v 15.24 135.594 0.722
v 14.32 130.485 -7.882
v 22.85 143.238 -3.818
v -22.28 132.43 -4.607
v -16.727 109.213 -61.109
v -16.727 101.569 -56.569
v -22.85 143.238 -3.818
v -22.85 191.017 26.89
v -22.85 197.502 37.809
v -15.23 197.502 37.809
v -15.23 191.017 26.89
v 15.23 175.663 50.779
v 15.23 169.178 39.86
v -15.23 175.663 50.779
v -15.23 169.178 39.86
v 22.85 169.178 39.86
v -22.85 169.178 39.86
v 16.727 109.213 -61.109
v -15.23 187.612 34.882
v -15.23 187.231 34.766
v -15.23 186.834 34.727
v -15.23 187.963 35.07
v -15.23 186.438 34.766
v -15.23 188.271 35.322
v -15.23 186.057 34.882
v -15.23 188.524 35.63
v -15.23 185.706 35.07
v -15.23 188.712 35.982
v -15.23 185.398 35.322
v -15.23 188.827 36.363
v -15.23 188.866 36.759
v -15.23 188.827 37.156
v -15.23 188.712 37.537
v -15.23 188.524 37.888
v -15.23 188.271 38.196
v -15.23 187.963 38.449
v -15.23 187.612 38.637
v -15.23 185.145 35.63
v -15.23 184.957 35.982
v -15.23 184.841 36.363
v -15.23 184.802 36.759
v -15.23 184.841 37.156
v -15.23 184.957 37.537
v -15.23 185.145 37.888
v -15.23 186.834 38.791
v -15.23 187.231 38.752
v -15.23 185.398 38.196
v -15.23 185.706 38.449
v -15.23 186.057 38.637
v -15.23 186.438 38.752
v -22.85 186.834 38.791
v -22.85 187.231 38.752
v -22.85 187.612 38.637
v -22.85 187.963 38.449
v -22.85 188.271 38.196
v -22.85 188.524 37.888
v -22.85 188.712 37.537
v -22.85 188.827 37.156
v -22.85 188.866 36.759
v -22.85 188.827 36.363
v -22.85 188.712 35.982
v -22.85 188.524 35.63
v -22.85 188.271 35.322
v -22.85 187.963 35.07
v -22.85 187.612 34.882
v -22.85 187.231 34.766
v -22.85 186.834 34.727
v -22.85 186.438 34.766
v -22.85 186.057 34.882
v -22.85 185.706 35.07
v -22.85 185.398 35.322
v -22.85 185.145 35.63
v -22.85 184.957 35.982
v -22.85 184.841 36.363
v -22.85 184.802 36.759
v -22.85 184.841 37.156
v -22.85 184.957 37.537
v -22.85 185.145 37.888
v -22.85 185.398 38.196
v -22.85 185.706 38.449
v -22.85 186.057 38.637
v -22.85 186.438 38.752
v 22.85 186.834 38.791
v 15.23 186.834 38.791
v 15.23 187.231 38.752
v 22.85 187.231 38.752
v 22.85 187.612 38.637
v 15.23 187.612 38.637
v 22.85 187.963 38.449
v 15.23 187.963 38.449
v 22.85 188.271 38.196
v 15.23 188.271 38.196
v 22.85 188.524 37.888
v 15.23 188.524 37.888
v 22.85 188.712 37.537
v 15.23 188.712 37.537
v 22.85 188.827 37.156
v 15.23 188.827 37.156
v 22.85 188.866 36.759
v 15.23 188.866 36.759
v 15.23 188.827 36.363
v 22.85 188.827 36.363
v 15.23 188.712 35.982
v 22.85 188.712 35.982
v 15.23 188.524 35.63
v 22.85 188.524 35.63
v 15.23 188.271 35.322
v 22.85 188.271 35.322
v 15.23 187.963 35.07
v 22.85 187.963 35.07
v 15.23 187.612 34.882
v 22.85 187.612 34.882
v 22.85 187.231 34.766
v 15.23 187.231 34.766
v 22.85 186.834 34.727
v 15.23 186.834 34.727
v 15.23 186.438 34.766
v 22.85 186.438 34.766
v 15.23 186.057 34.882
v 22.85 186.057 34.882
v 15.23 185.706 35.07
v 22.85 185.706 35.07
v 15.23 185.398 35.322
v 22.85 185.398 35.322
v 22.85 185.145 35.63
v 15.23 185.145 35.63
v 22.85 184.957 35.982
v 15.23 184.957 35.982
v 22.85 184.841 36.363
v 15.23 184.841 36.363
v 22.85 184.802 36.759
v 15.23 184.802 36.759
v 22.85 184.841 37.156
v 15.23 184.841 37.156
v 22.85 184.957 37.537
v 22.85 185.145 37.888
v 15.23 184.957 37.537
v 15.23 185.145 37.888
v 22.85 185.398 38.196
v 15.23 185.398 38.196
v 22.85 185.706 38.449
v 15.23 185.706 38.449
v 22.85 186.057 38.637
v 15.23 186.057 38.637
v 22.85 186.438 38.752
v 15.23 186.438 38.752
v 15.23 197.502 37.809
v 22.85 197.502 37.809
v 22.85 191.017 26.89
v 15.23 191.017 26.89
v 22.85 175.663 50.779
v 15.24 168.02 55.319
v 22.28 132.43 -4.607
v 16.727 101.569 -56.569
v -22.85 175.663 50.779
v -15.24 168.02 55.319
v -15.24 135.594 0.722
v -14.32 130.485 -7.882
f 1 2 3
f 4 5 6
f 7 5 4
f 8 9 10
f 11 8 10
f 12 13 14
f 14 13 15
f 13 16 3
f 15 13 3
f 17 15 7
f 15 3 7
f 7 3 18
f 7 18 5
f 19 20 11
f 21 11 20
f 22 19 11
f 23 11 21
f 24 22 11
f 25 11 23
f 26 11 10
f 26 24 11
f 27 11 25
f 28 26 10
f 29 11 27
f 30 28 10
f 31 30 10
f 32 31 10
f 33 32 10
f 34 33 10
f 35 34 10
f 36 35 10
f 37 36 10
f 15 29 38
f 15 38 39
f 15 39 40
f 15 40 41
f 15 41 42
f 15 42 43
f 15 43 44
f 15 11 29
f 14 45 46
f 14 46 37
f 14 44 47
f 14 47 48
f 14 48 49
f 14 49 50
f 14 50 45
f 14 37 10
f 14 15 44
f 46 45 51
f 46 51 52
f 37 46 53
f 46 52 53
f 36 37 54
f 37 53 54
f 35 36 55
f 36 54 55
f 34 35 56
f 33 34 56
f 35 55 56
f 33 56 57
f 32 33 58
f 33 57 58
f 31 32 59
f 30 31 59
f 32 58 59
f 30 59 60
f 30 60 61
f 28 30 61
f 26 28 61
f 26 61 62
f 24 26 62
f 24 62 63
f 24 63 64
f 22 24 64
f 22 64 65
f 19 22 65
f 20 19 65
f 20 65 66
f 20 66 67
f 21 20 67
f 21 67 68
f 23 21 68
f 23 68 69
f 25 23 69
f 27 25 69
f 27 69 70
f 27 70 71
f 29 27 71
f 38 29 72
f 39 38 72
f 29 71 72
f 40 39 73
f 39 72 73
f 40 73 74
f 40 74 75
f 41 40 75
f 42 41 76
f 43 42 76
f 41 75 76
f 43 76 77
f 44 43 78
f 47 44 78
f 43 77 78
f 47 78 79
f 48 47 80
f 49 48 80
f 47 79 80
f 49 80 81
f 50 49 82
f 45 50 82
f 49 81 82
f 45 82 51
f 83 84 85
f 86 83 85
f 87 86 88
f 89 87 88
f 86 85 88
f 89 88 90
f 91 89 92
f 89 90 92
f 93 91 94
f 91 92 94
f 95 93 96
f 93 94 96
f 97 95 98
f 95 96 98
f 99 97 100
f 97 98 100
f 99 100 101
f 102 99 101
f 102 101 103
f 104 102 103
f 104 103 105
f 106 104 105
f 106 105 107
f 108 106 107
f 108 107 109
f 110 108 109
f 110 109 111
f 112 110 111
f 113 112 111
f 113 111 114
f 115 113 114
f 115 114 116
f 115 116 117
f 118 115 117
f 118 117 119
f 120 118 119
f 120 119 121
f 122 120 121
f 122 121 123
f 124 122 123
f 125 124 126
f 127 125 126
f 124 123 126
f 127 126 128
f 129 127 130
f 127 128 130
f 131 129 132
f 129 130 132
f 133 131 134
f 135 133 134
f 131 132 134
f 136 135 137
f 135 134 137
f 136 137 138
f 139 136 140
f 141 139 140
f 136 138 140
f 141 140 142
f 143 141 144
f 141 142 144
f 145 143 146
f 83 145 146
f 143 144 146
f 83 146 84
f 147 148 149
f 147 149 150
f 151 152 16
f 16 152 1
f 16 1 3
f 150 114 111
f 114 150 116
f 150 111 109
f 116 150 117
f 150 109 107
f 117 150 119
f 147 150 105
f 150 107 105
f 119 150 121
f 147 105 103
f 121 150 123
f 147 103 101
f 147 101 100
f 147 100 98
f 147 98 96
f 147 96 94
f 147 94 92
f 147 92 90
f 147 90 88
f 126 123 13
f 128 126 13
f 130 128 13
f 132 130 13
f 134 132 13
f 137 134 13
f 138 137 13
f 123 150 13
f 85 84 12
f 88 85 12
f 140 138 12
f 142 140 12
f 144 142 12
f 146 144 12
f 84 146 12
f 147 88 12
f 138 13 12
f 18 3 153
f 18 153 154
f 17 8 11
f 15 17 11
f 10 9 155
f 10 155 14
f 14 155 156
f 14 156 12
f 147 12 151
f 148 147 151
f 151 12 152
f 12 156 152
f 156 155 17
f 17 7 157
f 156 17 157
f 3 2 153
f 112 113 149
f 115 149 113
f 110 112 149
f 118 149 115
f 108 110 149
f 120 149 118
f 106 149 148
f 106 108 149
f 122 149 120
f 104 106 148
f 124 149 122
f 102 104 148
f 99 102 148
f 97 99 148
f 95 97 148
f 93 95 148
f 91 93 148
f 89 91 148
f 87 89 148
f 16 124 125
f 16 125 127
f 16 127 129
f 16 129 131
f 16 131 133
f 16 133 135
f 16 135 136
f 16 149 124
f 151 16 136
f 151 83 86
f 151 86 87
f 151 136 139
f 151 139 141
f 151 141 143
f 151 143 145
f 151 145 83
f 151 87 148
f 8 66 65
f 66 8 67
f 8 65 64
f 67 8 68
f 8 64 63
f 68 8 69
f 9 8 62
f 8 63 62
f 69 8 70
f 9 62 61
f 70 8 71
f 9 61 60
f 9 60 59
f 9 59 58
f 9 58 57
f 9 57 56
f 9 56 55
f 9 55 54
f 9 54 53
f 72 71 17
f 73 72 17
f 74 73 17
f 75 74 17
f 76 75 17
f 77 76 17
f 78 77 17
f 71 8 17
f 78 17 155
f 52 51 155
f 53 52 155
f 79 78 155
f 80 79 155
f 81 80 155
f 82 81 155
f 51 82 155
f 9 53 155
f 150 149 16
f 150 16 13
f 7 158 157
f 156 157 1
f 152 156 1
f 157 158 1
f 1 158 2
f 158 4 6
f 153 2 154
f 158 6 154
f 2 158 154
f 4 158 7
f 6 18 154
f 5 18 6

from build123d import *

# Parameters (mm, degrees)
BOSS_EXTRUDE1_DEPTH = 8.89
SKETCH9_W           = 38.1
SKETCH9_H           = 170.494756514
CUT_EXTRUDE1_DEPTH  = 10.16
BOSS_EXTRUDE2_DEPTH = 63.5
SKETCH12_W          = 7.62
SKETCH12_H          = 12.7
BOSS_EXTRUDE3_DEPTH = 25.4
SKETCH13_R          = 2.031999997
CUT_EXTRUDE2_DEPTH  = 46.699791471


with BuildPart() as part:
    # Sketch2 → Boss-Extrude1 (new body)
    with BuildSketch(Plane(origin=(0, 107.565160262, -63.883098153), x_dir=(1, 0, 0), z_dir=(0, -0.859797598, 0.510634988))):
        Polygon((-16.72668145, 3.22686704), (-22.849895735, 69.859735371), (22.849895735, 69.859735371), (16.72668145, 3.22686704), align=None)
    extrude(amount=BOSS_EXTRUDE1_DEPTH)

    # Sketch9 → Cut-Extrude1 (cut)
    with BuildSketch(Plane(origin=(52.068196995, 40.765068024, -18.64540373), x_dir=(0.369989021, -0.048221617, 0.927783811), z_dir=(-0.75783864, -0.59332463, 0.27137885))):
        with Locations((0.146468301, 41.148554402)):
            Rectangle(SKETCH9_W, SKETCH9_H)
    cut_extrude1 = extrude(amount=CUT_EXTRUDE1_DEPTH, mode=Mode.SUBTRACT)

    # Mirror1: Cut-Extrude1 across plane
    add(cut_extrude1.mirror(Plane.ZY), mode=Mode.SUBTRACT)

    # Sketch11 → Boss-Extrude2 (add)
    with BuildSketch(Plane(origin=(0, 35.672825136, 60.065232647), x_dir=(1, 0, 0), z_dir=(0, 0.510634988, 0.859797598))):
        Polygon((-22.849895735, 125.105211449), (-15.24, 116.215211449), (15.24, 116.215211449), (22.849895735, 125.105211449), align=None)
    extrude(amount=BOSS_EXTRUDE2_DEPTH)

    # Sketch12 → Boss-Extrude3 (add)
    with BuildSketch(Plane(origin=(0, 107.565160262, -63.883098153), x_dir=(-1, 0, 0), z_dir=(0, 0.859797598, -0.510634988))):
        with Locations((-19.039895735, 127.009735371)):
            Rectangle(SKETCH12_W, SKETCH12_H)
    boss_extrude3 = extrude(amount=BOSS_EXTRUDE3_DEPTH)

    # Mirror2: Boss-Extrude3 across plane
    add(boss_extrude3.mirror(Plane(origin=(0, 0, 0), x_dir=(0, 0, 1), z_dir=(1, 0, 0))))

    # Sketch13 → Cut-Extrude2 (cut, through all)
    with BuildSketch(Plane.ZY.offset(22.849895735)):
        with Locations((36.759282263, 186.834421892)):
            Circle(SKETCH13_R)
    extrude(amount=-CUT_EXTRUDE2_DEPTH, mode=Mode.SUBTRACT)


solid = part.part
